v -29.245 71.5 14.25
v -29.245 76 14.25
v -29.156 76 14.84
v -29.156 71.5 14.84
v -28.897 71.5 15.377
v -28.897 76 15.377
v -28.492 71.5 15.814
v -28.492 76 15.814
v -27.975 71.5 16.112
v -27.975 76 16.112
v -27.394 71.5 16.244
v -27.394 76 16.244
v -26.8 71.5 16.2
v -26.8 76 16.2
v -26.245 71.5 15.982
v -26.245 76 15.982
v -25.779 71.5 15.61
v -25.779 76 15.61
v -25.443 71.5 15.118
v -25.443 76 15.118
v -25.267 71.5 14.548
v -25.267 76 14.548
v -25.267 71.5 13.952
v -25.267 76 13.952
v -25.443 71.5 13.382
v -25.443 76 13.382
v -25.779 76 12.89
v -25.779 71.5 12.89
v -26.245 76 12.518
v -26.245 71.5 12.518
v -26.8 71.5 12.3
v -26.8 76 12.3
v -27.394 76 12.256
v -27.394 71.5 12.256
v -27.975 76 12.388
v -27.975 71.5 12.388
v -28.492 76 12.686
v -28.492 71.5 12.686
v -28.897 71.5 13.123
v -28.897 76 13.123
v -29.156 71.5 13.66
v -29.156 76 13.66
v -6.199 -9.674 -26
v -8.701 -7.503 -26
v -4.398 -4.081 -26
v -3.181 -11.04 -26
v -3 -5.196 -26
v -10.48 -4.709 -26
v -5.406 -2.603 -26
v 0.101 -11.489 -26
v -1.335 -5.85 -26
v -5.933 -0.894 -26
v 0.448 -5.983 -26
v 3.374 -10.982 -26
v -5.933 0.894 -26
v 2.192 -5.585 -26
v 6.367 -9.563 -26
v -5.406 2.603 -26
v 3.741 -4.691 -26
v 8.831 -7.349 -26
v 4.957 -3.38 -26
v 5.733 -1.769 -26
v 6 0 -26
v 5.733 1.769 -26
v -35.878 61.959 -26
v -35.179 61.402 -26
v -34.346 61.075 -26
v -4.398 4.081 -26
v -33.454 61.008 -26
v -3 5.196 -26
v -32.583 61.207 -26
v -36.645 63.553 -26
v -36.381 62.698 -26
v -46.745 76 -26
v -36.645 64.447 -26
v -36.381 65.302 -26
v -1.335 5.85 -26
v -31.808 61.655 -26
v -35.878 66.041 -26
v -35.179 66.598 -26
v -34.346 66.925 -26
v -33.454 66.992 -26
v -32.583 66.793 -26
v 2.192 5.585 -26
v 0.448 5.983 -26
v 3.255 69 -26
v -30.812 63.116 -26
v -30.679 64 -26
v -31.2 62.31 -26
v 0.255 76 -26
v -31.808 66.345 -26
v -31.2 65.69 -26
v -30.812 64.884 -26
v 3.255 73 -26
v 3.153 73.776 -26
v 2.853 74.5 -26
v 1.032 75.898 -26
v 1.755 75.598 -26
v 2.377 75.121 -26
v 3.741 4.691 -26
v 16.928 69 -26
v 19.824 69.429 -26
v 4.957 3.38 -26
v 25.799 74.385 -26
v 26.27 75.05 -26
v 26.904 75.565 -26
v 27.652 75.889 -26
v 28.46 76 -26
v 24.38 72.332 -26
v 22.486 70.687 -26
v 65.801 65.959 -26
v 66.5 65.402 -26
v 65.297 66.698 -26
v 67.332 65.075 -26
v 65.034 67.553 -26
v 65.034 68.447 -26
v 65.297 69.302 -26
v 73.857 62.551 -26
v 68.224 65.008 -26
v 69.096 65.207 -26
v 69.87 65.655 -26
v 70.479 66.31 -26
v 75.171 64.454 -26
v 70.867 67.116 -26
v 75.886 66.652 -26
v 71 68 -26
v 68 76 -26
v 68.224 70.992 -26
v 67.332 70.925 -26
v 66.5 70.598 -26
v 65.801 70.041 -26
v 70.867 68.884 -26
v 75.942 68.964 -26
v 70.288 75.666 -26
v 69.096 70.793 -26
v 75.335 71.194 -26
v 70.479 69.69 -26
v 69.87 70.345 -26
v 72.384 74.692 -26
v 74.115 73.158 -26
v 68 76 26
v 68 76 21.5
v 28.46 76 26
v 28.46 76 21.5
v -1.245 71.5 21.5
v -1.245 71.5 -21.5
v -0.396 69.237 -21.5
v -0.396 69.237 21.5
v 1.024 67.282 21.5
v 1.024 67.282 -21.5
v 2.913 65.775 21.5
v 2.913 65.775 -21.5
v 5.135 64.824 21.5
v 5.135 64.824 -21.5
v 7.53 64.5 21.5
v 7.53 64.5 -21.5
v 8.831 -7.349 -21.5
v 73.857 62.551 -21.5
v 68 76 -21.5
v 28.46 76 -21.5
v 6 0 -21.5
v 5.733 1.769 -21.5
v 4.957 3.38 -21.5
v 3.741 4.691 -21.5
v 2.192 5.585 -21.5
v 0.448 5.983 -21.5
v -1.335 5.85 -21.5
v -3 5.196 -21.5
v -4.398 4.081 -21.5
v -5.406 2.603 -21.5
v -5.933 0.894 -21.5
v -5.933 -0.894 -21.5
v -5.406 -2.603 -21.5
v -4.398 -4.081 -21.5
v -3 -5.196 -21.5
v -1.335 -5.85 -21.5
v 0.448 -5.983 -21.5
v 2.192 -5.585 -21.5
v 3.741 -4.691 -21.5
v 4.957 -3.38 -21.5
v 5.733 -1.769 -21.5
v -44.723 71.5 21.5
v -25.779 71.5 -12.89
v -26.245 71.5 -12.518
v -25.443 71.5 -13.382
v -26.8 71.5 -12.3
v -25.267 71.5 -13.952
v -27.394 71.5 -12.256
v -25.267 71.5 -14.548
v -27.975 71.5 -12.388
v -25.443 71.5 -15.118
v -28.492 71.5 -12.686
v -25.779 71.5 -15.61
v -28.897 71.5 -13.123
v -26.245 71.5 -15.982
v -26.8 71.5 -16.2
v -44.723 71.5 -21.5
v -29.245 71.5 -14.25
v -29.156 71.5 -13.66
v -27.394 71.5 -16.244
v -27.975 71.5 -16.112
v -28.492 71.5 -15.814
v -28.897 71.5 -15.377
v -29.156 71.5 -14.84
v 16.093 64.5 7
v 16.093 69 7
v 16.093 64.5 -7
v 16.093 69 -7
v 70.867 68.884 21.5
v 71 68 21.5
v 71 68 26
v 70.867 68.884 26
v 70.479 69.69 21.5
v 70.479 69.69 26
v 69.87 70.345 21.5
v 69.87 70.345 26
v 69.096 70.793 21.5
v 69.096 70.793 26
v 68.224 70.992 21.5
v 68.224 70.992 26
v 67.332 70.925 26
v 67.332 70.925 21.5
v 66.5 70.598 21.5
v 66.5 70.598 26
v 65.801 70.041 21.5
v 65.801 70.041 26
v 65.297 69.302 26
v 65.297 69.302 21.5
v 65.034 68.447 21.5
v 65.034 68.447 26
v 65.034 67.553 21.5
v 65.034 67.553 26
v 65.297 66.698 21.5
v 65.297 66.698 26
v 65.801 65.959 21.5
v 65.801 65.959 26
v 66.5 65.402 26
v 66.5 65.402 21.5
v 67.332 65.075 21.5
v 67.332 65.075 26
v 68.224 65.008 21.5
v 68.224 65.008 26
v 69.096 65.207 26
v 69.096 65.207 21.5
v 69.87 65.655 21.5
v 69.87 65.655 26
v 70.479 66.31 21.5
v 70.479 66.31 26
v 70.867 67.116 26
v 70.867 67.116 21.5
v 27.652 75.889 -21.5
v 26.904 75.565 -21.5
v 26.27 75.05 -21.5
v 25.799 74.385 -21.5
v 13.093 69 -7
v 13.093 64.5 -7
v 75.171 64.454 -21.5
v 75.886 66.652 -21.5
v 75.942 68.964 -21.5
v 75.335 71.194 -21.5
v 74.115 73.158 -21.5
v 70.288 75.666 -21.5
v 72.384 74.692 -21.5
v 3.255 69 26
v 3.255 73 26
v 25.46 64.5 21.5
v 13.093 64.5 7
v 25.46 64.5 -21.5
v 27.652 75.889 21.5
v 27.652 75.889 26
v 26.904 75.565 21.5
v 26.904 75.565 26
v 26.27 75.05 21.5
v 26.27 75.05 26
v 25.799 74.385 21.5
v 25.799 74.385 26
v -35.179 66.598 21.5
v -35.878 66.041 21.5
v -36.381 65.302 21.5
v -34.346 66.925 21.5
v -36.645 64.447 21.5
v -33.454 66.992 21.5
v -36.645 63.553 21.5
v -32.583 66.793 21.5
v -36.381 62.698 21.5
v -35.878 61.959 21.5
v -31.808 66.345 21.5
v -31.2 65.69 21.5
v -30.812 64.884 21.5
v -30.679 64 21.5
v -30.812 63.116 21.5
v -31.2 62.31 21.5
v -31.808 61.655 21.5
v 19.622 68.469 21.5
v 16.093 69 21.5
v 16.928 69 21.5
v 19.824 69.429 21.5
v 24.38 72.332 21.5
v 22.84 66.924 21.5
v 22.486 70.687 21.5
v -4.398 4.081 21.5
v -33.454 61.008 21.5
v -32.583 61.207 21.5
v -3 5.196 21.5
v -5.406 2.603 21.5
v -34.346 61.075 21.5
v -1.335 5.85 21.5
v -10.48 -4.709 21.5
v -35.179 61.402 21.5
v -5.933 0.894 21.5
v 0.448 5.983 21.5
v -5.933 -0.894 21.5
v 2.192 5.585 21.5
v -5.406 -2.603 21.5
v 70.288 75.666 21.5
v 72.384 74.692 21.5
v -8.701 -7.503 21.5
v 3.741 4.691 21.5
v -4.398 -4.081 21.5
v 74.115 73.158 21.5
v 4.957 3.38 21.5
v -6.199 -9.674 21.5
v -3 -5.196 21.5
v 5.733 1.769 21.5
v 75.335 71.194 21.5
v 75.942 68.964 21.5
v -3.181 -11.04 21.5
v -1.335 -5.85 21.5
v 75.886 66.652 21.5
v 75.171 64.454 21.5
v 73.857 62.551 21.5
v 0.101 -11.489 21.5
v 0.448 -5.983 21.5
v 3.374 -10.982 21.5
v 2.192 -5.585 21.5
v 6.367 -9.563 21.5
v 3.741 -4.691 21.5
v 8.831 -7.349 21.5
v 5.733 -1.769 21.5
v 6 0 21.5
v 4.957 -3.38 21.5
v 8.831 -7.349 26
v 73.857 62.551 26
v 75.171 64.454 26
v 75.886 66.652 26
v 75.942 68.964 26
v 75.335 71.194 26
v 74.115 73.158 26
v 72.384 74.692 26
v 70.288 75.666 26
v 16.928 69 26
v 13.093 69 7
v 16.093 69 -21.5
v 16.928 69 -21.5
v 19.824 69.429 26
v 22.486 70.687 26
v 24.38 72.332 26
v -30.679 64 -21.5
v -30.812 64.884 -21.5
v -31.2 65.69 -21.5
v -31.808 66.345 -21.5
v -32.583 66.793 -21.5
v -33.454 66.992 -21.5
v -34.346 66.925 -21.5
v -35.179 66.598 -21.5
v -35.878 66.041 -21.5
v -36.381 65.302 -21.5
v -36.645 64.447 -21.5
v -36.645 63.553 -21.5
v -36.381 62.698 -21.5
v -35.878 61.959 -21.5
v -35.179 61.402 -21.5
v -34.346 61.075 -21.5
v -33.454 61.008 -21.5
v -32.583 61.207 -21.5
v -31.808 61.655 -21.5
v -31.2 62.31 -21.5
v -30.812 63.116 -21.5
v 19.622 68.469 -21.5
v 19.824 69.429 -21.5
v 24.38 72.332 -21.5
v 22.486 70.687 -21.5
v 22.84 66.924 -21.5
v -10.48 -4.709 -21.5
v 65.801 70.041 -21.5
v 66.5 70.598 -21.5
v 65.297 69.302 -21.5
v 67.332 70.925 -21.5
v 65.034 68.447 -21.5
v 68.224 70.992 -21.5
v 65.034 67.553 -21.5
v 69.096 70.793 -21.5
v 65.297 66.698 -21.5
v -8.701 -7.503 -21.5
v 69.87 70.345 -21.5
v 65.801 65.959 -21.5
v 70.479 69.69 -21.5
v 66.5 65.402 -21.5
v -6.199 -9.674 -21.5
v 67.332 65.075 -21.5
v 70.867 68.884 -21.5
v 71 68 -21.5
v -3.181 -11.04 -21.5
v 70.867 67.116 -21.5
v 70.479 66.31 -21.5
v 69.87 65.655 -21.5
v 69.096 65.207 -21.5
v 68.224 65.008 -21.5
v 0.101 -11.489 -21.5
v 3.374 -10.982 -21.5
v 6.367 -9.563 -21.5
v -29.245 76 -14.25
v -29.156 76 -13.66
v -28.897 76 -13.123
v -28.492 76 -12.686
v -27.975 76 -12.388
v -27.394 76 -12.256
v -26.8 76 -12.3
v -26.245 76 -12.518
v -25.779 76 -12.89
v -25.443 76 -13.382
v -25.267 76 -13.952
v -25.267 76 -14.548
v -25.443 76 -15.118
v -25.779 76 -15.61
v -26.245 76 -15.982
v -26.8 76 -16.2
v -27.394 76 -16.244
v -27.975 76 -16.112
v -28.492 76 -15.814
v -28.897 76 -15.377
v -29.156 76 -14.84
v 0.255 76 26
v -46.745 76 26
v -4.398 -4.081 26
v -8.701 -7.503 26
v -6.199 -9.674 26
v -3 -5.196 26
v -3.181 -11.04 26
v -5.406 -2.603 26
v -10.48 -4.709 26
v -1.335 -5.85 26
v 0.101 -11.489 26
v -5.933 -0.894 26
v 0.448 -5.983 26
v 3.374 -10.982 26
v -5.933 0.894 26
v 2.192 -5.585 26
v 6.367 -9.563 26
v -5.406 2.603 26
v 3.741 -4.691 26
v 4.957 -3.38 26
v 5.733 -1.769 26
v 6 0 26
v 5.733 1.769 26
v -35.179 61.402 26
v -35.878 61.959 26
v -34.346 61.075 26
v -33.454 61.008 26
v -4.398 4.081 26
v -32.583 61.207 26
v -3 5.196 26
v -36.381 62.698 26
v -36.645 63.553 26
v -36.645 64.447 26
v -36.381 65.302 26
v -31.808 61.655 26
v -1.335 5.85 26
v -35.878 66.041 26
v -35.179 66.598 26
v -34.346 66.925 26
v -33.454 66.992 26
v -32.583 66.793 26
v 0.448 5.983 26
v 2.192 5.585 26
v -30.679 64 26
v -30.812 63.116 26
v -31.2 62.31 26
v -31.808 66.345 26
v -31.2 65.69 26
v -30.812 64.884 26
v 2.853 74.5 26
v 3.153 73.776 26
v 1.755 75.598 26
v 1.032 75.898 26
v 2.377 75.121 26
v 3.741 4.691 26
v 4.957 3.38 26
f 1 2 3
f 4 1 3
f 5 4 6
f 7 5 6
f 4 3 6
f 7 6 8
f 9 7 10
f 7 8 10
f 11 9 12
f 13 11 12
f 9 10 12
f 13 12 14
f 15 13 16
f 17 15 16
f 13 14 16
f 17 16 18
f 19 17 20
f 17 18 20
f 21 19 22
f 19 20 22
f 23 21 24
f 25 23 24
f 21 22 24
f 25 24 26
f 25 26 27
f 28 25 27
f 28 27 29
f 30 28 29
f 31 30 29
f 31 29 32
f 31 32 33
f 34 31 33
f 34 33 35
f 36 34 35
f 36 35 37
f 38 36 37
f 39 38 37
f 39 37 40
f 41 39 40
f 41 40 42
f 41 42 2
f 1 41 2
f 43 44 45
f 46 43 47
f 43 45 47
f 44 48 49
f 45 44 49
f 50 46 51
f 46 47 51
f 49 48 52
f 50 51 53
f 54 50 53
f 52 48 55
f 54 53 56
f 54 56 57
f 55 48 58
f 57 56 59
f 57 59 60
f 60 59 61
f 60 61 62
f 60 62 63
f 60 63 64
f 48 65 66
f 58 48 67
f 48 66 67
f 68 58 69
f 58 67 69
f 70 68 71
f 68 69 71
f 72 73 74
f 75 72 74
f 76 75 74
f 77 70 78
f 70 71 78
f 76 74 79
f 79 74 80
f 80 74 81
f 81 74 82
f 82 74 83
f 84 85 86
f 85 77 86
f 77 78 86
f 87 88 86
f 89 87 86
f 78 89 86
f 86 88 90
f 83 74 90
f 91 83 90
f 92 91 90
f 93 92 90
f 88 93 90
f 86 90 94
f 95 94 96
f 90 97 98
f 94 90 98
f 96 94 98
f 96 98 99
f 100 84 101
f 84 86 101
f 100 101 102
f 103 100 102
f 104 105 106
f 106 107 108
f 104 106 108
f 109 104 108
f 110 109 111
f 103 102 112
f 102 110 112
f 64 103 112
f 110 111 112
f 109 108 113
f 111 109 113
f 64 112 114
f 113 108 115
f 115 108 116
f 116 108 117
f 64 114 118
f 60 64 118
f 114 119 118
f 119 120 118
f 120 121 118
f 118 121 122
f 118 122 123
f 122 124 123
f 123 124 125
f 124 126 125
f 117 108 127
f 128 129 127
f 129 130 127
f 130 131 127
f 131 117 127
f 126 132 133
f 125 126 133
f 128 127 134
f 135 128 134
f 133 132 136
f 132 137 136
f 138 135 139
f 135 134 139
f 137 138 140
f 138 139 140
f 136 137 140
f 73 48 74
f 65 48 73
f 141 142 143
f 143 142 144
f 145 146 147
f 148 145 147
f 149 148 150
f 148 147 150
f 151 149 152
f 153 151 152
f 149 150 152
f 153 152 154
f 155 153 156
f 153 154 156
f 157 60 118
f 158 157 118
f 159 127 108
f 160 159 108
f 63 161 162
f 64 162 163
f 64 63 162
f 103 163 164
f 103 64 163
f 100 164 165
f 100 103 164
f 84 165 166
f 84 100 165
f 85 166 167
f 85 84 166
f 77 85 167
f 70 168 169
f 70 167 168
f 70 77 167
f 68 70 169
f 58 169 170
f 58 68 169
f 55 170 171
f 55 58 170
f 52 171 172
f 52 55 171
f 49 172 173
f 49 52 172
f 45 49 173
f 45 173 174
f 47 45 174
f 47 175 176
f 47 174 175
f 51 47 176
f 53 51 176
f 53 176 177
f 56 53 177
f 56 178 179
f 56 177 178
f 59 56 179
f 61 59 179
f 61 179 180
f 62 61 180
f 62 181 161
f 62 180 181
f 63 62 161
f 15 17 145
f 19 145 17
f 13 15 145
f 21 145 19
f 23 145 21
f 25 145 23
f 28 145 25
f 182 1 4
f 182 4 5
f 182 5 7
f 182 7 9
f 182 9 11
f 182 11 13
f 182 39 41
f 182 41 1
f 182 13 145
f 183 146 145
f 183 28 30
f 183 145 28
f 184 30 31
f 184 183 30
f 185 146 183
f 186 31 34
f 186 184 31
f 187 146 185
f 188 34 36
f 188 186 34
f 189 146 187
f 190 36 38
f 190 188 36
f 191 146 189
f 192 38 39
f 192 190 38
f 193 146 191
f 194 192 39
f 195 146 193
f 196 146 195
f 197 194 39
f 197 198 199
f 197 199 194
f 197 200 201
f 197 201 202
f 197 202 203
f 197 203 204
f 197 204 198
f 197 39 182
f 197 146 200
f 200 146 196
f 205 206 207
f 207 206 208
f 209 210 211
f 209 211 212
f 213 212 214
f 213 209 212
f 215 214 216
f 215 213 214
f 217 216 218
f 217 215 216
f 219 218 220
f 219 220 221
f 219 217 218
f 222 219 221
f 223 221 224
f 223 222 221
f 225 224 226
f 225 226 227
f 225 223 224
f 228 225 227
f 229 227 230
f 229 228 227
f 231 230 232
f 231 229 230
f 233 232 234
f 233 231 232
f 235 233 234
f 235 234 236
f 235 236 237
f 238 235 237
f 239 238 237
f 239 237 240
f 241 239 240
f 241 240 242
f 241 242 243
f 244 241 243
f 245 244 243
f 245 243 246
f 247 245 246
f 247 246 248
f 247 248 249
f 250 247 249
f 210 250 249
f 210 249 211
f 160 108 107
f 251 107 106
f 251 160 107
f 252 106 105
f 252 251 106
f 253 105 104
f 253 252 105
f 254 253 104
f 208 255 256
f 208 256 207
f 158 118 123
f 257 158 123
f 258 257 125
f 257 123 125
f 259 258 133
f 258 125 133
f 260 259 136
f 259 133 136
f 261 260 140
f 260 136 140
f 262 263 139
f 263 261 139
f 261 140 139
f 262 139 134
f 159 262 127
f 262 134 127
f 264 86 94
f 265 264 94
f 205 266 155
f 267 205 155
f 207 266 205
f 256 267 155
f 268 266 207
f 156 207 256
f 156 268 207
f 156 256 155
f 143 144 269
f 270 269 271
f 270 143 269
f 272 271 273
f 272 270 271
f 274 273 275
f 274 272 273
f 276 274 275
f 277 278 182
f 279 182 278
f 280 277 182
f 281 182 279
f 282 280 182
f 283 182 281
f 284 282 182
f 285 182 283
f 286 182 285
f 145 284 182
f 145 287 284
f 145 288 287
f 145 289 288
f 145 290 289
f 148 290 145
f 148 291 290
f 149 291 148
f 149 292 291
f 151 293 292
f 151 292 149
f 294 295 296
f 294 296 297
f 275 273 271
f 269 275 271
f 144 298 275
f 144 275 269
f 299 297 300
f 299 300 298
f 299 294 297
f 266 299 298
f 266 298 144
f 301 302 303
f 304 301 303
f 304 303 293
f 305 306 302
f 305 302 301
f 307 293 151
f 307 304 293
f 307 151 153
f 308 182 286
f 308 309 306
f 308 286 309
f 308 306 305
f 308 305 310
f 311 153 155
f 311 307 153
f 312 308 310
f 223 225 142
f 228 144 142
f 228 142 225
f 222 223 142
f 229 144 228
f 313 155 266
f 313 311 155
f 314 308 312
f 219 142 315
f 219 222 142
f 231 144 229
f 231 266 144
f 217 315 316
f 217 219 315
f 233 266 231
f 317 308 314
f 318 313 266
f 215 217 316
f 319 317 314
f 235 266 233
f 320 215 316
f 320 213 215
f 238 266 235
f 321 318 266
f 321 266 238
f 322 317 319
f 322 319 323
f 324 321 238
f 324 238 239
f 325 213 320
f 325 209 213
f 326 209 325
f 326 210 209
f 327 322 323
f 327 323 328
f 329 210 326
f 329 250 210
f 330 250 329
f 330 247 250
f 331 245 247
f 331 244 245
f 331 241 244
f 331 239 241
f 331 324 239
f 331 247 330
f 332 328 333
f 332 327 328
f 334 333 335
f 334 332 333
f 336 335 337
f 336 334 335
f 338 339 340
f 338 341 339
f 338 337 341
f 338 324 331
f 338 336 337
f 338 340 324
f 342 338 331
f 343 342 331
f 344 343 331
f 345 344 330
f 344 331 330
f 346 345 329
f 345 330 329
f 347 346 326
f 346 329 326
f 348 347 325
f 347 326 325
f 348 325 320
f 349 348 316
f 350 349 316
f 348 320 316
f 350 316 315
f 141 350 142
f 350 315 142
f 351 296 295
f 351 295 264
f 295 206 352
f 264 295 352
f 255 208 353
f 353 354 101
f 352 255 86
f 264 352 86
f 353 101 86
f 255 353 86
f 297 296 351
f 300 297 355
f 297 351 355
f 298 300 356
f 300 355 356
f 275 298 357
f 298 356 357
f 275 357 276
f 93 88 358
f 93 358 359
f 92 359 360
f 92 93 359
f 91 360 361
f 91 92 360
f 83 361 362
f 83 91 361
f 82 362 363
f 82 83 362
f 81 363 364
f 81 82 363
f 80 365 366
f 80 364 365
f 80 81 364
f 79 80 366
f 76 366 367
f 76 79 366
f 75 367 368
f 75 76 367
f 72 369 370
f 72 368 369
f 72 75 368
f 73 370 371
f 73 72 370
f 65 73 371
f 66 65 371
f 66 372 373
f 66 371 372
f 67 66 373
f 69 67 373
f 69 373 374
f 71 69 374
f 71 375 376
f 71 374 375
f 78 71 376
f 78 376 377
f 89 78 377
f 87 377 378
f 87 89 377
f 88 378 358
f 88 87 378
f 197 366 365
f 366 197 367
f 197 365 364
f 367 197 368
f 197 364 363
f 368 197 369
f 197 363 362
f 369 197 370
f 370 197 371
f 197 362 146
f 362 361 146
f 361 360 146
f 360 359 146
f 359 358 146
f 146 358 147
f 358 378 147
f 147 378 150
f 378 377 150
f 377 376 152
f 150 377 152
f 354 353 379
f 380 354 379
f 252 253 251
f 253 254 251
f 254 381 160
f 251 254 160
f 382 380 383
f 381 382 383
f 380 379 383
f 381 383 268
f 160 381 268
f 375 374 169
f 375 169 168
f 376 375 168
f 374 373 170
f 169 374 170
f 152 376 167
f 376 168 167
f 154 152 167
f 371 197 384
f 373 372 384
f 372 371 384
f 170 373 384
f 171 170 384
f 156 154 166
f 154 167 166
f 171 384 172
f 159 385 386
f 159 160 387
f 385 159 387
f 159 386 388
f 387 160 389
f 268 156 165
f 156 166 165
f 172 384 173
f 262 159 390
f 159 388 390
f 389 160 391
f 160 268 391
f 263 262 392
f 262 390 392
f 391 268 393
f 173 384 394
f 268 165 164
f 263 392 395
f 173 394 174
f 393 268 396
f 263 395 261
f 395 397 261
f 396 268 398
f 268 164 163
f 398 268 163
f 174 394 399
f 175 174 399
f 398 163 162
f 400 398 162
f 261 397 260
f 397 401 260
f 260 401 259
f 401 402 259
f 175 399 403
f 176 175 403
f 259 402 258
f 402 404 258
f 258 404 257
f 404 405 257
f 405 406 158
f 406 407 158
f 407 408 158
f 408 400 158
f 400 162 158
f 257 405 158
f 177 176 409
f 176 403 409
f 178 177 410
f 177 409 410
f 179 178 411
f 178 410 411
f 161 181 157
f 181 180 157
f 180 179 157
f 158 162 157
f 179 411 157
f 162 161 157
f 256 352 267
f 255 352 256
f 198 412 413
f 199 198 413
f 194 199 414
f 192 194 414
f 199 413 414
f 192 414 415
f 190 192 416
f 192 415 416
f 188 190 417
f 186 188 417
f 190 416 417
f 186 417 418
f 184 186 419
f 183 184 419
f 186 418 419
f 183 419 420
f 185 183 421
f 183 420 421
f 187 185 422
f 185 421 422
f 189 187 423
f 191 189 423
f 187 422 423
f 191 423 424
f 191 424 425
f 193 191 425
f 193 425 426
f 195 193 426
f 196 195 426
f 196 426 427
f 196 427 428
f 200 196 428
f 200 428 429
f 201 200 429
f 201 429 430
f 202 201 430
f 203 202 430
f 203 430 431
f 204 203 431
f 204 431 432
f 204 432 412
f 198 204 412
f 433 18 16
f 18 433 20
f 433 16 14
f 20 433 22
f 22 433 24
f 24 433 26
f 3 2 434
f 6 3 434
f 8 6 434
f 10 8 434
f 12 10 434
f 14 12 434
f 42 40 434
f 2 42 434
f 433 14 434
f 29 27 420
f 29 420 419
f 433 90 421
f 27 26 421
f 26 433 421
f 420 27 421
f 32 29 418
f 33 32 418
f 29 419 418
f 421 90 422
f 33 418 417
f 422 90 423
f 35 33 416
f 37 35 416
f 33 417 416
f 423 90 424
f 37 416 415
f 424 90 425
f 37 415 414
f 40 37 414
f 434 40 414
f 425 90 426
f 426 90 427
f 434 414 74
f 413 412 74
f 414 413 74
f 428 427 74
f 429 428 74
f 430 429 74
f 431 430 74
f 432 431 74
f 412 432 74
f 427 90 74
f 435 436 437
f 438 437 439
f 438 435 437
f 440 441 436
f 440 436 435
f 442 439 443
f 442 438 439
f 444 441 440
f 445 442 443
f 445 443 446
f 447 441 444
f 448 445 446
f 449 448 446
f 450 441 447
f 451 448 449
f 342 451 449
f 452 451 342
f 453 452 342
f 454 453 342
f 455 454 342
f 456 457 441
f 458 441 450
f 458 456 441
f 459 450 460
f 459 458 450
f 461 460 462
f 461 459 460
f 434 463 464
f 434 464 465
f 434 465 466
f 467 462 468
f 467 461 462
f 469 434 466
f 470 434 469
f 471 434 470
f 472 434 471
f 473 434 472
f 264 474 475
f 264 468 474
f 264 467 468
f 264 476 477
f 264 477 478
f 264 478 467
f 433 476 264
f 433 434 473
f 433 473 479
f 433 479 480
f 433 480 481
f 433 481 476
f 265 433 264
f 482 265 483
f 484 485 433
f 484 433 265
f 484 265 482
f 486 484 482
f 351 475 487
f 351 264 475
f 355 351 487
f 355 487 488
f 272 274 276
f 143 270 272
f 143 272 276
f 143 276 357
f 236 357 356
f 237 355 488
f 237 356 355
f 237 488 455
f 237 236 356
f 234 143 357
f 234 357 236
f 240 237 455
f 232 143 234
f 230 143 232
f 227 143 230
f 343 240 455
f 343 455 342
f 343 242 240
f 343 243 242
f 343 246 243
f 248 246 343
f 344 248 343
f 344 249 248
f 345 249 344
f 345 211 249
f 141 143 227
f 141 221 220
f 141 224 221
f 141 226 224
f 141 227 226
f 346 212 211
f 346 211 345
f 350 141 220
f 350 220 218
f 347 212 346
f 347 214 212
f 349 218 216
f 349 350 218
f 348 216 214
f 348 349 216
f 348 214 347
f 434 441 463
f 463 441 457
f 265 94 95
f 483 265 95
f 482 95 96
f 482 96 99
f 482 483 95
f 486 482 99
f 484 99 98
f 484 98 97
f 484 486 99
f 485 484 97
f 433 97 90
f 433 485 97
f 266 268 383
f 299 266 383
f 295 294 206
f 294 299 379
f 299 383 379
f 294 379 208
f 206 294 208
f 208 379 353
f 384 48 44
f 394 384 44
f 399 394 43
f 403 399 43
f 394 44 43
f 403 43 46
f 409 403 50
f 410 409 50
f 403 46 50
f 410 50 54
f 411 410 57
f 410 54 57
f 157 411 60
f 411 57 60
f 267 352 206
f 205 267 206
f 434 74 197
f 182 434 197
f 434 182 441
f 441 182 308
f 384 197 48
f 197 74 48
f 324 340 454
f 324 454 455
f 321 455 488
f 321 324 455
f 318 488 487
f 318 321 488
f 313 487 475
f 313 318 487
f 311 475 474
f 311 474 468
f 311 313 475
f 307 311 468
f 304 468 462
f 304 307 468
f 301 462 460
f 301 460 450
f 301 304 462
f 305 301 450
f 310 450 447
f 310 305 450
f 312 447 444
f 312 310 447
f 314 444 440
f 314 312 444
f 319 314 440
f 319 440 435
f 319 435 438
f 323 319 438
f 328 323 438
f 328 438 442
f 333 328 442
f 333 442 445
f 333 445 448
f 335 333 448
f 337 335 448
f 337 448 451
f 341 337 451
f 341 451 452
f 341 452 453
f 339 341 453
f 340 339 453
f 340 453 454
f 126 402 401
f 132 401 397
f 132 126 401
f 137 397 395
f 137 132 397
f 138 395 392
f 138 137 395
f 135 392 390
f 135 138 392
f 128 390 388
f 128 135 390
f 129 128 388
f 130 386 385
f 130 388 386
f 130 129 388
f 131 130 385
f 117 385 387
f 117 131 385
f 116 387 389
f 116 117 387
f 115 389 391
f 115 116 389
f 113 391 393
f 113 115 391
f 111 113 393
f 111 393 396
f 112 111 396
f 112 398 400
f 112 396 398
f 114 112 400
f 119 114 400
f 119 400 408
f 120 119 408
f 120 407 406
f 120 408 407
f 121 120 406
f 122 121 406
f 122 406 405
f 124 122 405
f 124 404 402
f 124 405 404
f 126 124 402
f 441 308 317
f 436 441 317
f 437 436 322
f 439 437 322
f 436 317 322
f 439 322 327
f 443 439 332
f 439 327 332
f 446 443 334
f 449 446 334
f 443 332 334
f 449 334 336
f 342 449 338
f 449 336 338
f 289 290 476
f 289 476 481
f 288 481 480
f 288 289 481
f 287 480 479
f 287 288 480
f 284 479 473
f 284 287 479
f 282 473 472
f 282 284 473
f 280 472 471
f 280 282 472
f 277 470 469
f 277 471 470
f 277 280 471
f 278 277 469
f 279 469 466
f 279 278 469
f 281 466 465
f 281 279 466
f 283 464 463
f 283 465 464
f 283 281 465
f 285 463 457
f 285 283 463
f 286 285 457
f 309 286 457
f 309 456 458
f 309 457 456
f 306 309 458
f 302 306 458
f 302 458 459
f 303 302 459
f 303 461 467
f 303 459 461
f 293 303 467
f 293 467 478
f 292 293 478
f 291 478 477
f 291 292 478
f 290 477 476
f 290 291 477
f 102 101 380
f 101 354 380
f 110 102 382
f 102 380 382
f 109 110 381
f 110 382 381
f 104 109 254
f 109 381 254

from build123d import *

# Parameters (mm, degrees)
RESSALTO_EXTRUS_O1_DEPTH      = 26
RESSALTO_EXTRUS_O1_DEPTH_BACK = 26
ESBO_O10_R                    = 6
ESBO_O10_R_2                  = 3
CASCA1_START                  = -21.5
CASCA1_OUTLINE_R              = 10.5
CASCA1_DEPTH                  = 43
CORTE_EXTRUS_O1_DEPTH         = 111.580287574
CORTE_EXTRUS_O1_DEPTH_BACK    = 111.580287574
ESBO_O12_W                    = 43
ESBO_O12_H                    = 35.359478928
FILETE3_R                     = 9
ESBO_O17_W                    = 71.509931374
ESBO_O17_H                    = 43
CORTE_EXTRUS_O6_DEPTH         = 20
FILETE7_R                     = 3
FILETE8_R                     = 3
FILETE9_R                     = 12
ESBO_O18_W                    = 3
ESBO_O18_H                    = 14
CORTE_EXTRUS_O7_DEPTH         = 10
CORTE_EXTRUS_O8_DEPTH         = 120.398492453
CORTE_EXTRUS_O8_DEPTH_BACK    = 120.398492453
ESBO_O19_R                    = 3
FILETE10_R                    = 10
ESBO_O20_R                    = 2
CORTE_EXTRUS_O10_DEPTH        = 10


# Read off the part's stored shape, not the designer's step: Casca1
with BuildPart() as part:
    # Esboço10 → Ressalto-extrusão1 (new, two sides: drawn at the far end of the back side and taken through both)
    with BuildSketch(Plane.XY.offset(-RESSALTO_EXTRUS_O1_DEPTH_BACK)):
        with BuildLine():
            Line((8.831023296, -7.34936003), (73.857380106, 62.551046129))
            ThreePointArc((73.857380106, 62.551046129), (75.334563074, 71.194398928), (68, 76))
            Line((68, 76), (25.460219944, 76))
            Line((25.460219944, 76), (25.460219944, 69))
            Line((25.460219944, 69), (3.255321751, 69))
            Line((3.255321751, 69), (3.255321751, 76))
            Line((3.255321751, 76), (-46.744678249, 76))
            Line((-46.744678249, 76), (-10.47981176, -4.708886362))
            ThreePointArc((-10.47981176, -4.708886362), (-1.556486796, -11.383207552), (8.831023296, -7.34936003))
        make_face()
        Circle(ESBO_O10_R, mode=Mode.SUBTRACT)
        with Locations((68, 68)):
            Circle(ESBO_O10_R_2, mode=Mode.SUBTRACT)
    extrude(amount=RESSALTO_EXTRUS_O1_DEPTH + RESSALTO_EXTRUS_O1_DEPTH_BACK)

    # Casca1 outline → Casca1 (cut)
    with BuildSketch(Plane.XY.offset(CASCA1_START)):
        with BuildLine():
            Line((8.831023296, -7.34936003), (73.857380106, 62.551046129))
            Line((73.857380106, 62.551046129), (73.491293849, 62.891605746))
            ThreePointArc((73.491293849, 62.891605746), (63.658096197, 61.884620096), (61.366750419, 71.5))
            Line((61.366750419, 71.5), (29.960219944, 71.5))
            Line((29.960219944, 71.5), (29.960219944, 64.5))
            Line((29.960219944, 64.5), (-1.244678249, 64.5))
            Line((-1.244678249, 64.5), (-1.244678249, 71.5))
            Line((-1.244678249, 71.5), (-44.722696451, 71.5))
            Line((-44.722696451, 71.5), (-10.47981176, -4.708886362))
            ThreePointArc((-10.47981176, -4.708886362), (-1.556486796, -11.383207552), (8.831023296, -7.34936003))
        make_face()
        Circle(CASCA1_OUTLINE_R, mode=Mode.SUBTRACT)
    extrude(amount=CASCA1_DEPTH, mode=Mode.SUBTRACT)

    # Esboço12 → Corte-extrusão1 (cut, two sides: drawn at the far end of the back side and taken through both)
    with BuildSketch(Plane(origin=(0, 0, 0), x_dir=(0, 0, -1), z_dir=(1, 0, 0)).offset(-CORTE_EXTRUS_O1_DEPTH_BACK)):
        Rectangle(ESBO_O12_W, ESBO_O12_H)
    extrude(amount=CORTE_EXTRUS_O1_DEPTH + CORTE_EXTRUS_O1_DEPTH_BACK, mode=Mode.SUBTRACT)

    # Filete3
    # the kernel refuses this fillet: 9 mm, written as the material it takes off along each edge
    with BuildSketch(Plane(origin=(-1.244678249, 64.5, -21.5), x_dir=(0, 1, 0), z_dir=(0, 0, 1))) as filete3_piece_1:
        with BuildLine():
            CenterArc((9, -8.774964387), FILETE3_R, 102.839588407, 77.160411593)
            Line((0, -8.774964387), (0, 0))
            Line((0, 0), (7, 0))
        make_face()
    extrude(amount=43, mode=Mode.SUBTRACT)

    # Esboço17 → Corte-extrusão6 (cut)
    with BuildSketch(Plane(origin=(0, 76, 0), x_dir=(1, 0, 0), z_dir=(0, 1, 0))):
        with Locations((61.215185631, 0)):
            Rectangle(ESBO_O17_W, ESBO_O17_H)
    extrude(amount=-CORTE_EXTRUS_O6_DEPTH, mode=Mode.SUBTRACT)

    # Filete7
    filete7_edges = [part.edges().sort_by_distance(p)[0] for p in [
        (25.460219944, 76, 23.75),
        (25.460219944, 76, -23.75),
    ]]
    fillet(filete7_edges, radius=FILETE7_R)

    # Filete8
    filete8_edges = [part.edges().sort_by_distance(p)[0] for p in [
        (3.255321751, 76, 0),
    ]]
    fillet(filete8_edges, radius=FILETE8_R)

    # Filete9
    # the kernel refuses this fillet: 12 mm, written as the material it takes off along each edge
    with BuildSketch(Plane(origin=(25.460219944, 69, -21.5), x_dir=(-1, 0, 0), z_dir=(0, 0, 1))) as filete9_piece_1:
        with BuildLine():
            CenterArc((9.367496998, 12), FILETE9_R, 218.682187453, 51.317812547)
            Line((0, 4.5), (0, 0))
            Line((0, 0), (9.367496998, 0))
        make_face()
    extrude(amount=43, mode=Mode.SUBTRACT)

    # Esboço18 → Corte-extrusão7 (cut)
    with BuildSketch(Plane(origin=(0, 69, 0), x_dir=(1, 0, 0), z_dir=(0, 1, 0))):
        with Locations((14.592722946, 0)):
            Rectangle(ESBO_O18_W, ESBO_O18_H)
    extrude(amount=-CORTE_EXTRUS_O7_DEPTH, mode=Mode.SUBTRACT)

    # Esboço19 → Corte-extrusão8 (cut, two sides: drawn at the far end of the back side and taken through both)
    with BuildSketch(Plane.XY.offset(26).offset(-CORTE_EXTRUS_O8_DEPTH_BACK)):
        with Locations((-33.678552977, 64)):
            Circle(ESBO_O19_R)
    extrude(amount=CORTE_EXTRUS_O8_DEPTH + CORTE_EXTRUS_O8_DEPTH_BACK, mode=Mode.SUBTRACT)

    # Filete10
    filete10_edges = [part.edges().sort_by_distance(p)[0] for p in [
        (25.460219944, 69, -23.75),
        (25.460219944, 69, 23.75),
    ]]
    fillet(filete10_edges, radius=FILETE10_R)

    # Esboço20 → Corte-extrusão10 (cut)
    with BuildSketch(Plane(origin=(0, 76, 0), x_dir=(1, 0, 0), z_dir=(0, 1, 0))):
        with Locations(Location((-27.244678249, 14.25, 0), (0, 0, 180))):
            Circle(ESBO_O20_R)
        with Locations(Location((-27.244678249, -14.25, 0), (0, 0, 180))):
            Circle(ESBO_O20_R)
    extrude(amount=-CORTE_EXTRUS_O10_DEPTH, mode=Mode.SUBTRACT)


solid = part.part
